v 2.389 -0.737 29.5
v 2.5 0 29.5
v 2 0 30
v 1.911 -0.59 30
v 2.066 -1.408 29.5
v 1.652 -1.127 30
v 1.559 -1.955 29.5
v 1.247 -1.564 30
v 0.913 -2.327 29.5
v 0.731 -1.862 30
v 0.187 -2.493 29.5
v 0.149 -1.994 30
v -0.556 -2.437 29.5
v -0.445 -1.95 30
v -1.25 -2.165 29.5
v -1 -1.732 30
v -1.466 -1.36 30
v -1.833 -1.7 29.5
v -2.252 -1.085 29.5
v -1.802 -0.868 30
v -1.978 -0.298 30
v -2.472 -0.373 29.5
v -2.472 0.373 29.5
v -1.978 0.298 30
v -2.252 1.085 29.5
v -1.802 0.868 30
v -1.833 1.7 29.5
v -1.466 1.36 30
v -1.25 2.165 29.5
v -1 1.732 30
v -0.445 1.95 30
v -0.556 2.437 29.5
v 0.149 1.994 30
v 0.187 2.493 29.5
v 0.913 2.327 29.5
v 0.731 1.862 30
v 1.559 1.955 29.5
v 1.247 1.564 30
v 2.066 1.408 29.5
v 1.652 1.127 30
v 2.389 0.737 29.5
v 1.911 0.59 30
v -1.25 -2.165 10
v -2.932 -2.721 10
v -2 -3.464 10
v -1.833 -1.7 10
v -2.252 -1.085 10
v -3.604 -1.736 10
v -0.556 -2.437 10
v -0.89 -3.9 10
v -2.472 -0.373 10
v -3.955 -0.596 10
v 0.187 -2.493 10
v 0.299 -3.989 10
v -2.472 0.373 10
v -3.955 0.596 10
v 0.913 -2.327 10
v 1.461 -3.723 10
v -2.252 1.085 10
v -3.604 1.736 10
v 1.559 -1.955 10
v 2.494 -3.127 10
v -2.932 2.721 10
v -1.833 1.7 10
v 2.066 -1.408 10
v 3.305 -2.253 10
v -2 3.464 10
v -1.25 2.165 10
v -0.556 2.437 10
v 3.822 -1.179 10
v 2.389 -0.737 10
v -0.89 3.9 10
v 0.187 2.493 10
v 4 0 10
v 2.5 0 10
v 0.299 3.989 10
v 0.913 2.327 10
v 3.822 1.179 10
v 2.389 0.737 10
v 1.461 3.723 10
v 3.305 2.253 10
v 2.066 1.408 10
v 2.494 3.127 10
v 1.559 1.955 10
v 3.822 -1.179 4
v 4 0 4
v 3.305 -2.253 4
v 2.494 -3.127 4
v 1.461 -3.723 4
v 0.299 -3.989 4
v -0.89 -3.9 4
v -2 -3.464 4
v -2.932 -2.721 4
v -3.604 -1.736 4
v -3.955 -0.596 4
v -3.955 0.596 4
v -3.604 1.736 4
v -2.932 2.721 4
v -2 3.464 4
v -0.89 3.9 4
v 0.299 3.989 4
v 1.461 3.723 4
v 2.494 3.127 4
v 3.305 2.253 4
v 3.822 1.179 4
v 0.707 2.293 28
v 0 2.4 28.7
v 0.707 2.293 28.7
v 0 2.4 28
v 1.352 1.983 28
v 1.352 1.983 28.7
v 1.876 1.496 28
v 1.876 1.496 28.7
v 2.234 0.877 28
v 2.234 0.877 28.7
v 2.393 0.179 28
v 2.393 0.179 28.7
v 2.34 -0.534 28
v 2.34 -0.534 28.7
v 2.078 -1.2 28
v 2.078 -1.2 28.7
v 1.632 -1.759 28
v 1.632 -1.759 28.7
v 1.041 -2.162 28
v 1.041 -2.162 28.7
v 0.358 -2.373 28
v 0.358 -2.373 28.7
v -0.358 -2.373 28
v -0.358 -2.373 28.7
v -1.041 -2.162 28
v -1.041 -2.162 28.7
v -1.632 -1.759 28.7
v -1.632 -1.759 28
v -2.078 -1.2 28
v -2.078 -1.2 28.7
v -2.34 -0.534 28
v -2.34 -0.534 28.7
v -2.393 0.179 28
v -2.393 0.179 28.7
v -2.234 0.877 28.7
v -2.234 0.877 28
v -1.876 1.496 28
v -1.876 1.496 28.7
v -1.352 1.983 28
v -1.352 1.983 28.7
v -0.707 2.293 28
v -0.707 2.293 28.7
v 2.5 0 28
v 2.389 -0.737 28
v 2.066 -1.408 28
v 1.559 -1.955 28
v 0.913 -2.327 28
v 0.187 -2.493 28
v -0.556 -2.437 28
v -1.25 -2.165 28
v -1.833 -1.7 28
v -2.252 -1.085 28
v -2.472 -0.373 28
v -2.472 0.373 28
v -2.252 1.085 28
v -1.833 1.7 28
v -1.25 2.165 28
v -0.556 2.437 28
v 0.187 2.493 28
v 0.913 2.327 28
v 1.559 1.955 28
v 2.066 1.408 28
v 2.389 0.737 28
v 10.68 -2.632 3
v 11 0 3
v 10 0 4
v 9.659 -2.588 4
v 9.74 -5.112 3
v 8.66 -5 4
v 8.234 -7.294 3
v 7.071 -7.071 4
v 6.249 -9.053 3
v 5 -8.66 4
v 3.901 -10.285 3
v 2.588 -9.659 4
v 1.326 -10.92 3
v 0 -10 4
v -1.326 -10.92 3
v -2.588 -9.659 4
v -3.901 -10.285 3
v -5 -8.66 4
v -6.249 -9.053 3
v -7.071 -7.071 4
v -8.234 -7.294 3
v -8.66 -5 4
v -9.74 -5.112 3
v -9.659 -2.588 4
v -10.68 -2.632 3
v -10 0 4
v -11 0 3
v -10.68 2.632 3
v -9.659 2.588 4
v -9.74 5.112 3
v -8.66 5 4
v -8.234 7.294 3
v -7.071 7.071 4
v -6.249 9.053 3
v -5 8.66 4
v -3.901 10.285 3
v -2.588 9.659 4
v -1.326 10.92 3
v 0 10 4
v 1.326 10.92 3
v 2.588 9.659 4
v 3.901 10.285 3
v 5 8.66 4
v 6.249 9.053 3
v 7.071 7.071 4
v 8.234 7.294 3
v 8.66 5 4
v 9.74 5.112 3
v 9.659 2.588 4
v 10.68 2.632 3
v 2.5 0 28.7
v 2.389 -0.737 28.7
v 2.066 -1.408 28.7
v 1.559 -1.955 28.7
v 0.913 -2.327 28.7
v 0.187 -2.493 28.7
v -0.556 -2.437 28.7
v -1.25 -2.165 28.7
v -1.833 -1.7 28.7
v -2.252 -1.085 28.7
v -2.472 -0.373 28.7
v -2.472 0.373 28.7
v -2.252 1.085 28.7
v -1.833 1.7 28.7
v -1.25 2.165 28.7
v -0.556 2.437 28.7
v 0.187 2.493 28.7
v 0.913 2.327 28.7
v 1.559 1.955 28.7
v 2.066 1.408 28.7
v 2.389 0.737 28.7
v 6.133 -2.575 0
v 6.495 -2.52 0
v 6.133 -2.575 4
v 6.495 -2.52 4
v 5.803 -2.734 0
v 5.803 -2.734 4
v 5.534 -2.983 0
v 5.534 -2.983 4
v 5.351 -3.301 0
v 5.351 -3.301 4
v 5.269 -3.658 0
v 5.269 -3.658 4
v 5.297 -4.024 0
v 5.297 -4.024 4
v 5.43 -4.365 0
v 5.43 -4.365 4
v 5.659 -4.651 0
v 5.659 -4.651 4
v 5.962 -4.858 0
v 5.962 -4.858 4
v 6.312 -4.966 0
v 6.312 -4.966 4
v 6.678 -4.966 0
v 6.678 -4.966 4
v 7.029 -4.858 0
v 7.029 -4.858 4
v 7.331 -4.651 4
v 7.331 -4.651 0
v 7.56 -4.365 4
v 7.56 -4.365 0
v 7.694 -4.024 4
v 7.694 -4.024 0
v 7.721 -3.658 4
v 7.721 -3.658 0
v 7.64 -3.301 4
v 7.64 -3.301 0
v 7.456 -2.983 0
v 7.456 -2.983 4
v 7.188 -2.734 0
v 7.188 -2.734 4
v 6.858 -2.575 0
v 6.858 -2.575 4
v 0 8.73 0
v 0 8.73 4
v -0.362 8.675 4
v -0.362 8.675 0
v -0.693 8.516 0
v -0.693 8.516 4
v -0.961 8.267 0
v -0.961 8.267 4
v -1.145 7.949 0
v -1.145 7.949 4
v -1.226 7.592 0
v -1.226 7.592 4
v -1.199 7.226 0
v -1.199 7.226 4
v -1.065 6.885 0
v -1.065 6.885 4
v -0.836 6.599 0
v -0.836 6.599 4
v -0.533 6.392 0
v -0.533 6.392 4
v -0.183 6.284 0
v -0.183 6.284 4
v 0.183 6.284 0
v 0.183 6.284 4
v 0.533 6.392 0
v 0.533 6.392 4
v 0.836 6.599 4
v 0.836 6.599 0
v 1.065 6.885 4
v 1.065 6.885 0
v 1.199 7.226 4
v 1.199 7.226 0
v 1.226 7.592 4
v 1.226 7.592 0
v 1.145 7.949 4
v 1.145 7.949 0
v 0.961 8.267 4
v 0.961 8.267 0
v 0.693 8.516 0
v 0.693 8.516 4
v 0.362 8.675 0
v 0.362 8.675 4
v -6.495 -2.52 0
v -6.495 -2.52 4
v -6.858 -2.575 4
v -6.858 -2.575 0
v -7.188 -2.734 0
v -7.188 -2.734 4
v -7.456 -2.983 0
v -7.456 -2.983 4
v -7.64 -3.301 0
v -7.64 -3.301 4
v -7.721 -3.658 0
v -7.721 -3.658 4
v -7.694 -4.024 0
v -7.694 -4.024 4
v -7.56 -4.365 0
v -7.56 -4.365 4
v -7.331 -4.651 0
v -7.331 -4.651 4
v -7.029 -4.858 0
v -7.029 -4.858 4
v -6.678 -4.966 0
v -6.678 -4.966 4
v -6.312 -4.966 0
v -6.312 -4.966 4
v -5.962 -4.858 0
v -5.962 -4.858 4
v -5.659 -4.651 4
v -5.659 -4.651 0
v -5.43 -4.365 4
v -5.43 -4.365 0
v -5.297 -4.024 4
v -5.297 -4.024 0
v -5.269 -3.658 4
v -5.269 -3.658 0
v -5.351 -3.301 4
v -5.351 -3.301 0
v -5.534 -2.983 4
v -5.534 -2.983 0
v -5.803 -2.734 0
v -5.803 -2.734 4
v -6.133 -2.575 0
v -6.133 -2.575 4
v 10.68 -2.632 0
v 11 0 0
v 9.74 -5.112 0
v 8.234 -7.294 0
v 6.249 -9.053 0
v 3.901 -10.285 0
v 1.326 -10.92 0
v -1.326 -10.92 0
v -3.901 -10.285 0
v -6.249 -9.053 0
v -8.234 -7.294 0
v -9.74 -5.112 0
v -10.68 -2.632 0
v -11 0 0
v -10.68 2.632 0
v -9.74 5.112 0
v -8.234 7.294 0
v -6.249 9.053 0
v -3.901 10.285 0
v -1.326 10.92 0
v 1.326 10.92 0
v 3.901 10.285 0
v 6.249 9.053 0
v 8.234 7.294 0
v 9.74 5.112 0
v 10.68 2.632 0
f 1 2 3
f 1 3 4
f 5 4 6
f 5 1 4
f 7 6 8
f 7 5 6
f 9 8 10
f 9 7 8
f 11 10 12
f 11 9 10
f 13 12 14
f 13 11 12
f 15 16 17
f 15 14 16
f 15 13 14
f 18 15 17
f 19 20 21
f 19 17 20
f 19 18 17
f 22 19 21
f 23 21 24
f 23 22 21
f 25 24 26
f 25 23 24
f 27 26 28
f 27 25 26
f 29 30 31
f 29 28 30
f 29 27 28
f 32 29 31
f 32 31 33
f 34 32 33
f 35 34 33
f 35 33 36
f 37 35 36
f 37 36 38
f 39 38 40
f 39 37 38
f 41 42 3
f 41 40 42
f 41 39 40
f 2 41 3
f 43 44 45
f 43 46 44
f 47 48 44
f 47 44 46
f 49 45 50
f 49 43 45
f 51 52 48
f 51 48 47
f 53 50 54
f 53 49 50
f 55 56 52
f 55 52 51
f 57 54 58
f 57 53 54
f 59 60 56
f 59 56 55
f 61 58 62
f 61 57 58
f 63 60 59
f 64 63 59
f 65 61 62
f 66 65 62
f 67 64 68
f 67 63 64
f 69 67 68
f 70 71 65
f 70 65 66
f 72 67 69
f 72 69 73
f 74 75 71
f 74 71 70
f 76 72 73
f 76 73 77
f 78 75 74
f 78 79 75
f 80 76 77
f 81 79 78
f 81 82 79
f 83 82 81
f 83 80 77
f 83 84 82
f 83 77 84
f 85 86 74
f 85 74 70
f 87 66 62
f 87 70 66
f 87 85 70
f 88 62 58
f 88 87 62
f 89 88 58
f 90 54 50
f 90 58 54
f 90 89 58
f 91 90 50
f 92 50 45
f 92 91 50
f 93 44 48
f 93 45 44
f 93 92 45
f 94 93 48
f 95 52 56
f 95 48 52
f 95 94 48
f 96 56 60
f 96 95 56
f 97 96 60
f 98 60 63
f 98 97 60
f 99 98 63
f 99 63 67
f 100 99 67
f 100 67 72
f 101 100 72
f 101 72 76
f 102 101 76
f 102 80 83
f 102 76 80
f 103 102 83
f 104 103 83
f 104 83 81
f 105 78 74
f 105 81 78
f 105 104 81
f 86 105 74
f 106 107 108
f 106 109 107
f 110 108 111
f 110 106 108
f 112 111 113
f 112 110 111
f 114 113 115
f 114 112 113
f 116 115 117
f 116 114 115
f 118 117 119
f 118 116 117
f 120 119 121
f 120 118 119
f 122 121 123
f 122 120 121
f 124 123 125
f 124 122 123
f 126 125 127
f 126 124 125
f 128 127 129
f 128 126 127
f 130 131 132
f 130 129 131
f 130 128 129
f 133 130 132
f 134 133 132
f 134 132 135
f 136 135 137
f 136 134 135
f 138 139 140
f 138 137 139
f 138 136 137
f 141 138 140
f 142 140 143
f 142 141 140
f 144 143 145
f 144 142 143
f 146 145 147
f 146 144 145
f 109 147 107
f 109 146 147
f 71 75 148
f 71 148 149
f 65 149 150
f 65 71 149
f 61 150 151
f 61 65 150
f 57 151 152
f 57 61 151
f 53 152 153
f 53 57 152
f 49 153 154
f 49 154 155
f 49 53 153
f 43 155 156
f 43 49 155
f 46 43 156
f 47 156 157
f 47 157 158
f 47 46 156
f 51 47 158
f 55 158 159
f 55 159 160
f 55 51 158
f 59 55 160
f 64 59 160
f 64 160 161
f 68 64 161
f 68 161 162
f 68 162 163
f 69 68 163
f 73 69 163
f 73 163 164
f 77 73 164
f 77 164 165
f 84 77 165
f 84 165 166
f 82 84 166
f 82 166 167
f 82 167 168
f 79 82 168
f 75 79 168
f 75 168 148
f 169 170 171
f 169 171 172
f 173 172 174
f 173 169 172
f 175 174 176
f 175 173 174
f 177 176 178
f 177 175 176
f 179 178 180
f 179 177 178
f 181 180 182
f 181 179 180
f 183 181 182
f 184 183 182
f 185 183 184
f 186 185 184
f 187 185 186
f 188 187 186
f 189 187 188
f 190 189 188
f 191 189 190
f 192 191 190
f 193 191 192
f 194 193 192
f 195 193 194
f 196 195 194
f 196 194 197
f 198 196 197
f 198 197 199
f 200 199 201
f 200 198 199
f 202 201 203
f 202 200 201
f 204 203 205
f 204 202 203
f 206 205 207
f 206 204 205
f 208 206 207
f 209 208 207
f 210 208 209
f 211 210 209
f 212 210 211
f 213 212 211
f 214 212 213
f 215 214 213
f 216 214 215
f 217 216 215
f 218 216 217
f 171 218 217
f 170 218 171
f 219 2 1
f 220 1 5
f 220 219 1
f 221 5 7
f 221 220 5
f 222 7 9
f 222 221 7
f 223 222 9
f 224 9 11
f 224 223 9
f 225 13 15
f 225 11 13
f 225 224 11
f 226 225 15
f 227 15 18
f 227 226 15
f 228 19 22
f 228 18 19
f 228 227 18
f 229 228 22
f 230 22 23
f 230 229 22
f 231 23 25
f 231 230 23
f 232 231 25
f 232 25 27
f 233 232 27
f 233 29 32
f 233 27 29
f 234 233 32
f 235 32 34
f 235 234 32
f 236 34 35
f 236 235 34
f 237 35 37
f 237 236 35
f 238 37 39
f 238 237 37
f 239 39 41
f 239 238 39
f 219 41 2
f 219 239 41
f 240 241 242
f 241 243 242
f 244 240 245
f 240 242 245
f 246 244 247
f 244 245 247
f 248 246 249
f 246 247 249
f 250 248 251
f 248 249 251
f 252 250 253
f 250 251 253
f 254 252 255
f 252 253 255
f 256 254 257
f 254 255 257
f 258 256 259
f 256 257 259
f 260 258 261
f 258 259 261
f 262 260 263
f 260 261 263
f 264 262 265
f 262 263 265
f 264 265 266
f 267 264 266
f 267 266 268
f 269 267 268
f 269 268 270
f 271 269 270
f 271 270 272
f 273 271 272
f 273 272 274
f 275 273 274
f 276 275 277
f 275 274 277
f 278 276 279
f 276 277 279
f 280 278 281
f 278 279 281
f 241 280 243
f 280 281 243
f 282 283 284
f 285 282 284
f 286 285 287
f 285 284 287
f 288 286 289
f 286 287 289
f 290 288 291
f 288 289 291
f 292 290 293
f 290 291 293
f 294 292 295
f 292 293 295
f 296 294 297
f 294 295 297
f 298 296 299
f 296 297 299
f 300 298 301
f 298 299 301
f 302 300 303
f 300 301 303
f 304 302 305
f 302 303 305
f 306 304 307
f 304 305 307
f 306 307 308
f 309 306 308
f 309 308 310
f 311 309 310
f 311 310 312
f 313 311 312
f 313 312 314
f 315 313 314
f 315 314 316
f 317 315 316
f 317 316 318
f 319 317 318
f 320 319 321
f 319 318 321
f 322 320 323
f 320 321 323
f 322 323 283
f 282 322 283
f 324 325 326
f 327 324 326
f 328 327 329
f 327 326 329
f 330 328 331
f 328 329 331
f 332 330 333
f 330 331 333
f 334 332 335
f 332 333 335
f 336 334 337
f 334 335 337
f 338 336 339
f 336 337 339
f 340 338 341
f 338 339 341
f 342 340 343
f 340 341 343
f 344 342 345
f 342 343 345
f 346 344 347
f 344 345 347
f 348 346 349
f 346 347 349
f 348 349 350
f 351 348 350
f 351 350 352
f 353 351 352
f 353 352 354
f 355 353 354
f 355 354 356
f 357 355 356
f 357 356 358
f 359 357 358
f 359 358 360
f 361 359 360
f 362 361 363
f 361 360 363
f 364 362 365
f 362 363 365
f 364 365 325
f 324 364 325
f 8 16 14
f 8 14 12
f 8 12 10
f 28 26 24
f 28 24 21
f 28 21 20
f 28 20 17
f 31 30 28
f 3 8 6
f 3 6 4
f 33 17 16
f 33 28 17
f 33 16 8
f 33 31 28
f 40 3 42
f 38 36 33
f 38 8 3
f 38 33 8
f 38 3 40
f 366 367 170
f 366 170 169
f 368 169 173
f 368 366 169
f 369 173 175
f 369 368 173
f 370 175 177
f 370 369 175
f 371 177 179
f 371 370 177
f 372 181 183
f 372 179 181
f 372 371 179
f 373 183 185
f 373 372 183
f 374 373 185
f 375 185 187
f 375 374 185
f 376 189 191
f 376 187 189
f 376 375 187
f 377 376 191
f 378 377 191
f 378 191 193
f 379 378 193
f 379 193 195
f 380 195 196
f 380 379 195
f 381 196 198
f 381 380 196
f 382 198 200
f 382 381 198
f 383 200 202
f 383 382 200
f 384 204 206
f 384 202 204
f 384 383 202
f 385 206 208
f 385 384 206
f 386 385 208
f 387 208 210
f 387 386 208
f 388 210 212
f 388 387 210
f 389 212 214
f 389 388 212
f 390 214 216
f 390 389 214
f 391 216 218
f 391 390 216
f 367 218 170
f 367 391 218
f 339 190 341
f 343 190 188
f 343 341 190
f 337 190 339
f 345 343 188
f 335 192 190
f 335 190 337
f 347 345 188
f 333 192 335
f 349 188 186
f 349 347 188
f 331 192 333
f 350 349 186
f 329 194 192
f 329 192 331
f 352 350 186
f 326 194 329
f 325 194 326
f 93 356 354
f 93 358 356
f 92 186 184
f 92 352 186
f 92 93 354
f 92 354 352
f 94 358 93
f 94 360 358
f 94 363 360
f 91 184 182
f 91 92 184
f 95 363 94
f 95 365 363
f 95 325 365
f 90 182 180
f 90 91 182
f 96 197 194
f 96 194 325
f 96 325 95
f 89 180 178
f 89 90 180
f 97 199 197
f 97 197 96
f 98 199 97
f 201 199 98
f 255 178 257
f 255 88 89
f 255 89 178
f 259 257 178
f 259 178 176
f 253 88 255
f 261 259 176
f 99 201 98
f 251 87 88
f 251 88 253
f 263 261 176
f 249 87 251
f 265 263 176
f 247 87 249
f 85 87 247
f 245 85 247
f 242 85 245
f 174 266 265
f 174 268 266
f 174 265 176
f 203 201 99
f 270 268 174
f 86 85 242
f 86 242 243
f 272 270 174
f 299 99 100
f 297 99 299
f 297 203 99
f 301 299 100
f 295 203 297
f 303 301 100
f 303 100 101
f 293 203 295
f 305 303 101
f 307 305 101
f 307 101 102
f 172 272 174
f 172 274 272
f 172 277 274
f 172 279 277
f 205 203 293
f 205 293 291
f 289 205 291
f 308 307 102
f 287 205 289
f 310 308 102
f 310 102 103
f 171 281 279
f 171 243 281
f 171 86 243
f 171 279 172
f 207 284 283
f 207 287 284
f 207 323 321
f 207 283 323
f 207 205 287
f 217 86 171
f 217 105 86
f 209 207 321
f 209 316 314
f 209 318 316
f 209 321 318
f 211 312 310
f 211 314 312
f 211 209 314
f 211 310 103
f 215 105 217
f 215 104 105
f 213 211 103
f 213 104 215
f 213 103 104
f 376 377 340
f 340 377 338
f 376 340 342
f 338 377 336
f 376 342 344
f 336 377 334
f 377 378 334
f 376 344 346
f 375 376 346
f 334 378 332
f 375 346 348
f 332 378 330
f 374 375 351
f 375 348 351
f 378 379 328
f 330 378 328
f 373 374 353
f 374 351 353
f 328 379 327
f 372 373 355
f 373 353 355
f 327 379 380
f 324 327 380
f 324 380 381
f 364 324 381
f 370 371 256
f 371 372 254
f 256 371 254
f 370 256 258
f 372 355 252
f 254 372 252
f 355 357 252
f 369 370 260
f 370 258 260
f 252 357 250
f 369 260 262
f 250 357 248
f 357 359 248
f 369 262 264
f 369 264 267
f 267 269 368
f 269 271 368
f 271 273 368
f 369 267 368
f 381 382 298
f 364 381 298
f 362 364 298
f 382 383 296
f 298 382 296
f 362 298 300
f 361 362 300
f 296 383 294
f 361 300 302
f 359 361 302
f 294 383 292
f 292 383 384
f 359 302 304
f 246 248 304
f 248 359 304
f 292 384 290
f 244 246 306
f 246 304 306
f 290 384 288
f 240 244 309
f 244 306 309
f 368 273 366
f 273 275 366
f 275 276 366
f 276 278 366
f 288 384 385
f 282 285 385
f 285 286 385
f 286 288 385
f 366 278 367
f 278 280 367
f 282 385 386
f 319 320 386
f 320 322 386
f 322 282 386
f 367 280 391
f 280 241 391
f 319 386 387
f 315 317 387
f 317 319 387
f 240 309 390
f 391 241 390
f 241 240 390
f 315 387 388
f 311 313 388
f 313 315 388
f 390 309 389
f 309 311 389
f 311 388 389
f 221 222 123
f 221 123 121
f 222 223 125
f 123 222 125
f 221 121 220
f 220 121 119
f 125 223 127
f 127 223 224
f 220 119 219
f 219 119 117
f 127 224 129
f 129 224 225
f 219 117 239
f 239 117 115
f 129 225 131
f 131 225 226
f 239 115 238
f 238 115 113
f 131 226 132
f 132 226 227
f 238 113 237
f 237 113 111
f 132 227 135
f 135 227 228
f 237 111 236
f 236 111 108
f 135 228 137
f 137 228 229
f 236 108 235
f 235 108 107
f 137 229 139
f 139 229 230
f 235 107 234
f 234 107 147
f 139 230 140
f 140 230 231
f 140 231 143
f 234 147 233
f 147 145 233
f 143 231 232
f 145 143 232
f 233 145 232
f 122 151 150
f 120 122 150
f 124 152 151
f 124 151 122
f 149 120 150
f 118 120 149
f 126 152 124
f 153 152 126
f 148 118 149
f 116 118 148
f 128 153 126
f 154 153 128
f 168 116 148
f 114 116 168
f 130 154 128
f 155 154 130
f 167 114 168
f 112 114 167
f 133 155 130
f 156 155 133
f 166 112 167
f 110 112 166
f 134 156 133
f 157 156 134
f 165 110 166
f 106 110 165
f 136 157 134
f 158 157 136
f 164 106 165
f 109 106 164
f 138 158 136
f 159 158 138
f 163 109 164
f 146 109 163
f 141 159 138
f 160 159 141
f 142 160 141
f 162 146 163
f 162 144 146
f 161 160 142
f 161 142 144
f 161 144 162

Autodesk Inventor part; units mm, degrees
ref_plane "YZ Plane" through (0, 0, 0) normal (1, 0, 0) x (0, 1, 0)
ref_plane "XZ Plane" through (0, 0, 0) normal (0, 1, 0) x (-1, 0, 0)
ref_plane "XY Plane" through (0, 0, 0) normal (0, 0, 1) x (1, 0, 0)
sketch "Skizze1" plane through (0, 0, 0) normal (0, 0, 1) x (1, 0, 0)
  circle A0 centre (0, 0) radius 11
  dimension "d0" = 22
extrude "Extrusion1" add sketch "Skizze1" along normal blind 4
sketch "Skizze2" plane through (0, 0, 4) normal (0, 0, 1) x (1, 0, 0)
  circle A0 centre (0, 0) radius 11 projected
  circle A1 centre (0, 0) radius 4
  dimension "d3" = 8
extrude "Extrusion2" add sketch "Skizze2" along normal blind 6 contours A1
sketch "Skizze3" plane through (0, 0, 10) normal (0, 0, 1) x (1, 0, 0)
  circle A0 centre (0, 0) radius 4 projected
  circle A1 centre (0, 0) radius 2.5
  dimension "d6" = 5
extrude "Extrusion3" add sketch "Skizze3" along normal blind 20 contours A1
sketch "Skizze4" plane through (0, 0, 0) normal (0, 0, -1) x (-1, 0, 0)
  circle A0 centre (0, 0) radius 11 projected
  line L0 (17.5, 0) -> (-17.5, 0) projected
  line L1 (0, -17.5) -> (0, 17.5) projected
  circle A1 centre (0, 0) radius 7.5
  line L2 (6.4952, -3.75) -> (0, 0)
  line L3 (0, 0) -> (-6.4952, -3.75)
  point P0 (0, 7.5)
  dimension "d9" = 15
  dimension "d10" = 120
  dimension "d11" = 120
hole "Bohrung1" at (0, 7.5, 0) at (-6.4952, -3.75, 0) at (6.4952, -3.75, 0) direction (0, 0, 1) diameter 2.459 end through all thread size "M3x0.5" class "6H" standard "ISO Metric profile"
chamfer "Fase1" distance 0.5 angle 45 1 edges at (-2.5, 0, 30)
sketch "Skizze5" plane through (0, 0, 0) normal (1, 0, 0) x (0, 1, 0)
  line L0 (-2.5, 10) -> (2.5, 10) projected
  line L1 (2.5, 29.5) -> (-2.5, 29.5) projected
  line L2 (2.5, 10) -> (2.5, 29.5) projected
  line L3 (0, -4.3) -> (0, 25.8) projected
  line L4 (2.5, 28.7) -> (2.4, 28.7)
  line L5 (2.4, 28.7) -> (2.4, 28)
  line L6 (2.4, 28) -> (2.5, 28)
  line L7 (2.5, 28) -> (2.5, 28.7)
  point P0 (0, 0)
  dimension "d31" = 18
  dimension "d32" = 0.7
  dimension "d33" = 4.8
revolve "Umdrehung1" cut sketch "Skizze5" angle 360 about axis through (0, 0, -10) along (0, 0, 1)
chamfer "Fase3" distance 1 angle 45 1 edges at (-11, 0, 4)
properties part number "13_0204_017"
